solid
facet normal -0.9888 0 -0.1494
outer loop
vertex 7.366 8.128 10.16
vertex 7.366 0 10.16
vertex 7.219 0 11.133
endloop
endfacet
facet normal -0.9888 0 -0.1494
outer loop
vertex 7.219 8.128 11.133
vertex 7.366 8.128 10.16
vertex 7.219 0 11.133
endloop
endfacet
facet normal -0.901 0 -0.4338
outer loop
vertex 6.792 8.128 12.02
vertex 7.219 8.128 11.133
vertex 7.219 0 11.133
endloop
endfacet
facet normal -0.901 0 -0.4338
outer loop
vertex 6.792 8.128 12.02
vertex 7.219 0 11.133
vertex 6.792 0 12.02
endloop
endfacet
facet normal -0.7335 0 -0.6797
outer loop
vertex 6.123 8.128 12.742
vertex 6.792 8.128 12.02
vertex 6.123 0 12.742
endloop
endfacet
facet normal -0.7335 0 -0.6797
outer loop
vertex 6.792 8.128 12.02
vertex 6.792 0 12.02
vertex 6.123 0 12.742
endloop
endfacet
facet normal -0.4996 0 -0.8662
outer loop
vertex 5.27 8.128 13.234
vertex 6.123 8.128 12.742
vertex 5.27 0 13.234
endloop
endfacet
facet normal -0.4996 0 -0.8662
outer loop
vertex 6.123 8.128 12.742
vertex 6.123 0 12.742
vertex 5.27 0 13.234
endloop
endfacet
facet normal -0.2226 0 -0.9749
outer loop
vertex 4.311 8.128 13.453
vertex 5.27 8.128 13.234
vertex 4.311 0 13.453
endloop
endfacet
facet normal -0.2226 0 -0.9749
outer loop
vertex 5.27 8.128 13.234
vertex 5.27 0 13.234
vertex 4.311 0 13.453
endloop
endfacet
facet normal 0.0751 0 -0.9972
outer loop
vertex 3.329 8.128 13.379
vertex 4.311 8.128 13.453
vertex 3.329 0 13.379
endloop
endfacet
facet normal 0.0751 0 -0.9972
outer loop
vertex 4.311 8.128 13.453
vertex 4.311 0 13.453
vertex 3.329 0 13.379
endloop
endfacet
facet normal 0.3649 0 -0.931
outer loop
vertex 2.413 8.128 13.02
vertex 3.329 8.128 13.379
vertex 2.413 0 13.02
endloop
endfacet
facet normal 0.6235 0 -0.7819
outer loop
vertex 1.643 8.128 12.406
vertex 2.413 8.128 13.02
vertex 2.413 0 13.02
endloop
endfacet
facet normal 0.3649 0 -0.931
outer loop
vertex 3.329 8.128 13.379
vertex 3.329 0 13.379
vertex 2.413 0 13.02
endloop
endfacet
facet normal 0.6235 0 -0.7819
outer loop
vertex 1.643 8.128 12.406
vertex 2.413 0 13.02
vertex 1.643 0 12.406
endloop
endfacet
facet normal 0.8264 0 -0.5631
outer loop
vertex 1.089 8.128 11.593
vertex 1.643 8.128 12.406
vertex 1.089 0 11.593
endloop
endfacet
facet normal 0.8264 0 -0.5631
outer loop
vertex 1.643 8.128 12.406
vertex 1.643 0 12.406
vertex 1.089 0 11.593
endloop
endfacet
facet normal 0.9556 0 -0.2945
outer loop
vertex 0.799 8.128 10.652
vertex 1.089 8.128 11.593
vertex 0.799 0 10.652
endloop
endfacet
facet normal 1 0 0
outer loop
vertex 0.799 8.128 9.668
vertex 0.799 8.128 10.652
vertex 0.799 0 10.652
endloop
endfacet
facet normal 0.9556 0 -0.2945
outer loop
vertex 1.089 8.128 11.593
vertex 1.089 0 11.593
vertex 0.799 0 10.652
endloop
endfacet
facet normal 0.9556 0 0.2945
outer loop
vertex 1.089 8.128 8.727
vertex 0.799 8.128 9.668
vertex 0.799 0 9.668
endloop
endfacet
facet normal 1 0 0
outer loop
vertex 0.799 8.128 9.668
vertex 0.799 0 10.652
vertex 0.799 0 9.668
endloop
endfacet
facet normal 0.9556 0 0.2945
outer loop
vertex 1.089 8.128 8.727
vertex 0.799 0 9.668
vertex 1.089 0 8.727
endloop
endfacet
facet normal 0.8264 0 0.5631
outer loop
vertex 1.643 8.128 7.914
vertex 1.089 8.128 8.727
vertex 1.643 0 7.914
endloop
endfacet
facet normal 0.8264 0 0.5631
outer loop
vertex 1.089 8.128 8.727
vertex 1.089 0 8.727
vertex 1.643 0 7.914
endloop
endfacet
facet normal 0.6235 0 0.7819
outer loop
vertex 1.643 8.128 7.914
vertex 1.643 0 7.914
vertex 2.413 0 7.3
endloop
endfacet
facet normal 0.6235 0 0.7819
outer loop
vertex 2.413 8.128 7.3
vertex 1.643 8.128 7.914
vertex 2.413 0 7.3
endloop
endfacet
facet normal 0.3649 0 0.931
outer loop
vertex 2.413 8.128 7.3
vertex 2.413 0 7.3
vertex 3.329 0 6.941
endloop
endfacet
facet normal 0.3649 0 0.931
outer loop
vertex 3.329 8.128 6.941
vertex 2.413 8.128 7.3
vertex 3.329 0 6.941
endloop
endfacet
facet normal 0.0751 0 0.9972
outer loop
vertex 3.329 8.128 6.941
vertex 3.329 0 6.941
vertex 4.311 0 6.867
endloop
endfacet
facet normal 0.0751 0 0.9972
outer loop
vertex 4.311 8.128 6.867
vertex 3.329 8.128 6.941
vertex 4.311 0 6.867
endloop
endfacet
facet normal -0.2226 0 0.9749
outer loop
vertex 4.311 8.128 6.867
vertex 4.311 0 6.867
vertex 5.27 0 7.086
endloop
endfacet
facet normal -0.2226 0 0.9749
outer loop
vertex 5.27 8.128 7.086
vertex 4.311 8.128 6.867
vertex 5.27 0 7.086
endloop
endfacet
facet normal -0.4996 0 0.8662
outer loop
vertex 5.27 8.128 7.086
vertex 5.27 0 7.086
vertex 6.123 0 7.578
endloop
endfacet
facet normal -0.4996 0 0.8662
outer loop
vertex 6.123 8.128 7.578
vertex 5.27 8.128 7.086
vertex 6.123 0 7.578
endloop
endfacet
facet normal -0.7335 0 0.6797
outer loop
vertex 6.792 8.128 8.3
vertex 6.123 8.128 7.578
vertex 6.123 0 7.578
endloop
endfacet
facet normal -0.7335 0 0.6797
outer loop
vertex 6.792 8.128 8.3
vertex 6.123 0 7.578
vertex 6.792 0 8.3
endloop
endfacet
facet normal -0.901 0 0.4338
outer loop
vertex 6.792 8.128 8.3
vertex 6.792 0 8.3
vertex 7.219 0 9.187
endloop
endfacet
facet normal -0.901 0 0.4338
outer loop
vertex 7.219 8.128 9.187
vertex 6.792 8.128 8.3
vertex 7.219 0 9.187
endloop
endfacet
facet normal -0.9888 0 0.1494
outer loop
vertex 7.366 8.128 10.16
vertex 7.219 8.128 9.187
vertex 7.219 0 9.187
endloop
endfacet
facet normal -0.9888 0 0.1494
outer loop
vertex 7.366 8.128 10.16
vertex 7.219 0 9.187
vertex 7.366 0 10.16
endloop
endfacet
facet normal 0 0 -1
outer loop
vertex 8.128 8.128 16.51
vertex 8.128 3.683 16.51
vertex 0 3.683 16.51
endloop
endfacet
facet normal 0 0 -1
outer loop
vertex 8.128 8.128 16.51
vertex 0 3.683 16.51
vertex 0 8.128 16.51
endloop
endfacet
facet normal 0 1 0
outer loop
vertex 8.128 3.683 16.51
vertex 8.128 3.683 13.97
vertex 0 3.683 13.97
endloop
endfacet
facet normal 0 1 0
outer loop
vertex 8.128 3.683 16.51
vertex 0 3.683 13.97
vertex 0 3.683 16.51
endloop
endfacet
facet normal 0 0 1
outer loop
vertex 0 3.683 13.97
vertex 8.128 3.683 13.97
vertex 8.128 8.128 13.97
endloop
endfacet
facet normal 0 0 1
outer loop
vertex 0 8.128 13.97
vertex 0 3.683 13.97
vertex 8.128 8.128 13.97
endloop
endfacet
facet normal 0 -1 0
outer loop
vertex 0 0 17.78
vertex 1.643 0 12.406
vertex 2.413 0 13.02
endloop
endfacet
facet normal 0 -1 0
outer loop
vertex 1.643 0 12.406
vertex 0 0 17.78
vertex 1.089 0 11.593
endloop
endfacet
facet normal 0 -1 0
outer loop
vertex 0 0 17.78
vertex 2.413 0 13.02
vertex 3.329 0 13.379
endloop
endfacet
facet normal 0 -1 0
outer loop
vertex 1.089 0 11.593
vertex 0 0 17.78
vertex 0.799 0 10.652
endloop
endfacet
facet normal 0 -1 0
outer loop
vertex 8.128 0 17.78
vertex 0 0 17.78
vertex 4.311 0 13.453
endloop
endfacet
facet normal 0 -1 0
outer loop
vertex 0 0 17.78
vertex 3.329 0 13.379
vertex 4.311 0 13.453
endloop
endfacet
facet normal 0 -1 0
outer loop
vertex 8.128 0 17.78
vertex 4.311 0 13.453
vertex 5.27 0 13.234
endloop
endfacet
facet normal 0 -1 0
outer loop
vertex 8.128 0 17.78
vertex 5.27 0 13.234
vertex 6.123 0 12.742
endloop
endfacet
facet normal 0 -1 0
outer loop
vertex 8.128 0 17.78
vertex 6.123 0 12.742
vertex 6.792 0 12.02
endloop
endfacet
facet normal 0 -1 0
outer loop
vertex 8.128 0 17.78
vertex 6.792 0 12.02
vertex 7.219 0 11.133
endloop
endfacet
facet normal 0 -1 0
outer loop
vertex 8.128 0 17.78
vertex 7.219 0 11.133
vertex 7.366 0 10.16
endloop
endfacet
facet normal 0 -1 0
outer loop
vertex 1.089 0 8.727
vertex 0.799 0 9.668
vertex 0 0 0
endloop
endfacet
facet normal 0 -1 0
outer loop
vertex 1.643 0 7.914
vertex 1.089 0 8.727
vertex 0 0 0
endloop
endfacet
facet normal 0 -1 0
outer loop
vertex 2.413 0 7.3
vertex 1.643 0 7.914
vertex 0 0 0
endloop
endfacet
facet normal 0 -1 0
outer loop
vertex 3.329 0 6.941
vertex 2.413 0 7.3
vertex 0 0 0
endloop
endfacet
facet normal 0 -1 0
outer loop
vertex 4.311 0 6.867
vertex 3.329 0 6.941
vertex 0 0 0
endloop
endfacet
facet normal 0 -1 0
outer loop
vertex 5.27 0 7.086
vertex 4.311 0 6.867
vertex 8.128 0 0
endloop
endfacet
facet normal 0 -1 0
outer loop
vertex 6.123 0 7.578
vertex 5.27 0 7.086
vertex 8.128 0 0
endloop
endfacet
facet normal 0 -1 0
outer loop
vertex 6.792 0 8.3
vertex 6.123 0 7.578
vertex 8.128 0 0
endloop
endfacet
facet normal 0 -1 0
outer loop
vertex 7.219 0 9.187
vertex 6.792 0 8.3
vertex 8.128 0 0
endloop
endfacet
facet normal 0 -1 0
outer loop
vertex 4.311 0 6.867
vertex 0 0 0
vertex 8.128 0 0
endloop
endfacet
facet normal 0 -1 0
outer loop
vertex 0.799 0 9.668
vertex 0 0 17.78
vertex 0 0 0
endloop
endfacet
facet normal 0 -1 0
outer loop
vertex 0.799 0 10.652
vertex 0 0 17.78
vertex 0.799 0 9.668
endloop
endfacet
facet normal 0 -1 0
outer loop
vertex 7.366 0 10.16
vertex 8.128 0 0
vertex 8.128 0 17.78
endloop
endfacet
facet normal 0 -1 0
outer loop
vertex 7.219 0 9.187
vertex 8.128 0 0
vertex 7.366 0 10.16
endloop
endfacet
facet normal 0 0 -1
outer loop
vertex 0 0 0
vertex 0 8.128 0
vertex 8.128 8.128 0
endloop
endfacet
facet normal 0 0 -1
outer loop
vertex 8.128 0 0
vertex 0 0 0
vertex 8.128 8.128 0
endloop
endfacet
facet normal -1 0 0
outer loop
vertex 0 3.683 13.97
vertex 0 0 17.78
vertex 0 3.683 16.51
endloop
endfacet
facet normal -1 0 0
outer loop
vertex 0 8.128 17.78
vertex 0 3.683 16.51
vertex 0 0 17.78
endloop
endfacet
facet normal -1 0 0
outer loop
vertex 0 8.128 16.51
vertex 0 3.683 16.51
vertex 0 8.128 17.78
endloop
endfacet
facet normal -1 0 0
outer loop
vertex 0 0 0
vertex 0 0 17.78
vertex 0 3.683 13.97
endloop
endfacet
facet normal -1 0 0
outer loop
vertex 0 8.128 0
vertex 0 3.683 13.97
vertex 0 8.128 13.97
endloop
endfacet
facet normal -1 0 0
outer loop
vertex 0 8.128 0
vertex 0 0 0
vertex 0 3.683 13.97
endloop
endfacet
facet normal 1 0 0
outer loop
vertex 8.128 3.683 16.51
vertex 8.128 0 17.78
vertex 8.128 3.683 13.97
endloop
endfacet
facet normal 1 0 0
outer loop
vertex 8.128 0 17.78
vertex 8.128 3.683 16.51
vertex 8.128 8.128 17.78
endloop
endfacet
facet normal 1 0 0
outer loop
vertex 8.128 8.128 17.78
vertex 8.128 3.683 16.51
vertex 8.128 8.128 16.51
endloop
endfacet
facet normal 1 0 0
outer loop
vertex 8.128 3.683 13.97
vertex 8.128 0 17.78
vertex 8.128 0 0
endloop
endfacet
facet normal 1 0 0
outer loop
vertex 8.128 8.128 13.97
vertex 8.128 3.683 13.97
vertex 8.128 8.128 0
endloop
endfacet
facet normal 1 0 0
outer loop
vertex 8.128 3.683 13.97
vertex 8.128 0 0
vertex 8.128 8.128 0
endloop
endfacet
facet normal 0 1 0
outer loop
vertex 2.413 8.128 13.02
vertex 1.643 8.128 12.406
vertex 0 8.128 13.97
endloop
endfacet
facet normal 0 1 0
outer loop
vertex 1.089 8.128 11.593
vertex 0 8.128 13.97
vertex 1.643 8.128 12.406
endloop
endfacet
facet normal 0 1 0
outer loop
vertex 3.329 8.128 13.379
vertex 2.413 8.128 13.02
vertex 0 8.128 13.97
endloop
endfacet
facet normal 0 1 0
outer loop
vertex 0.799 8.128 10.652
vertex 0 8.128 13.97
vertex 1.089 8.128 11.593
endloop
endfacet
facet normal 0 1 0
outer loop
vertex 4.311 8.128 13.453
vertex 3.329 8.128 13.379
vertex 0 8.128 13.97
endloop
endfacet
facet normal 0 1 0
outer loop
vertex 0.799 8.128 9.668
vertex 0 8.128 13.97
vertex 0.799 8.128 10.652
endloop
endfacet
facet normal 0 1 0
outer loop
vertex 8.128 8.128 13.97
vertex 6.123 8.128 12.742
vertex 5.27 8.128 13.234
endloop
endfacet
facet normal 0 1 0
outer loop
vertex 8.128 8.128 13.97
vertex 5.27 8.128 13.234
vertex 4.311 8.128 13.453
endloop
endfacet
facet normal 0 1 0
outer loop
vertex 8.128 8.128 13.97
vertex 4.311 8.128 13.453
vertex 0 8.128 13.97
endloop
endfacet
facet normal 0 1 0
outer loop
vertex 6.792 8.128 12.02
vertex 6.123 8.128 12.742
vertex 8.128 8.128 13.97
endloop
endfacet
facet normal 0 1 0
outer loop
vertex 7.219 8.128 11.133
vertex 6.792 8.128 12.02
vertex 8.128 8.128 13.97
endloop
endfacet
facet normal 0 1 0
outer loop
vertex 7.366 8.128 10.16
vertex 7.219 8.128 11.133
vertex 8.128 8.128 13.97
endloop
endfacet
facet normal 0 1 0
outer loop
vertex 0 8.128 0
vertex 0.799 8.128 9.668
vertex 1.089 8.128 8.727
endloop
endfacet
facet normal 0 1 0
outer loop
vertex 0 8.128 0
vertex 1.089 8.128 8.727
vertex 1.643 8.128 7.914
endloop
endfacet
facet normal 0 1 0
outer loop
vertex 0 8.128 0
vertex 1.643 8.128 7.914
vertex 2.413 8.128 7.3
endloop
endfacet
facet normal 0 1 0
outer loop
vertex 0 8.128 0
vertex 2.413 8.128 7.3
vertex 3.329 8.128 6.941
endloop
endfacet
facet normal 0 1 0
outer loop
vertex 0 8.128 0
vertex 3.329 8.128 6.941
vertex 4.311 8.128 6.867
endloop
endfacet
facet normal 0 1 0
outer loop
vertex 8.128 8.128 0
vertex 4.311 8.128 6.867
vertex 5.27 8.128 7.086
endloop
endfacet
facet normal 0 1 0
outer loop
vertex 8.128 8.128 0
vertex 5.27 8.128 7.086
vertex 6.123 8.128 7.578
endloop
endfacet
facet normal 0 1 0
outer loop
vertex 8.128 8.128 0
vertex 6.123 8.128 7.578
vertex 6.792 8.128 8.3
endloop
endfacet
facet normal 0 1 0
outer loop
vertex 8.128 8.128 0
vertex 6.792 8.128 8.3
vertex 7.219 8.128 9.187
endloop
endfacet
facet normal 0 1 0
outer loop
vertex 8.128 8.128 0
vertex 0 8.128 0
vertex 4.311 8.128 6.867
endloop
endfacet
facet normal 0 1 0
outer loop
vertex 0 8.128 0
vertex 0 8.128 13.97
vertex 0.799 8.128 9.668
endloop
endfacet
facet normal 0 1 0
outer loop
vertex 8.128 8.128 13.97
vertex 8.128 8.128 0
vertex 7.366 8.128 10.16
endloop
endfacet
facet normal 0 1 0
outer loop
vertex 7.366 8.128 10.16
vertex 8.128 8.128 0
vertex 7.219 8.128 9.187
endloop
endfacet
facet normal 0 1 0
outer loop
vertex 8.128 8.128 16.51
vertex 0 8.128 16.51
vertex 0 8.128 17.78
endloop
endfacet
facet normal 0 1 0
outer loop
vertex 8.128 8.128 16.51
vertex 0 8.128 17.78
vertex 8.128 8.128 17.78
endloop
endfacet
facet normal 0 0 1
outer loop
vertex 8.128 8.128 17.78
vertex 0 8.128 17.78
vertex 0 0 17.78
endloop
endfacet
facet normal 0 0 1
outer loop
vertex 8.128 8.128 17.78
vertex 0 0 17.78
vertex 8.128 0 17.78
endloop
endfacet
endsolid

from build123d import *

# Parameters (mm, degrees)
F0_W     = 8.128
F0_H     = 8.128
F1_DEPTH = 17.78
F2_W     = 4.445
F2_H     = 2.54
F3_DEPTH = 25.4
F4_R     = 3.302
F5_DEPTH = 25.4


with BuildPart() as f1:
    # F0 (on Top) → F1 (new body)
    with BuildSketch(Plane.XY):
        with Locations((4.064, 4.064)):
            Rectangle(F0_W, F0_H)
    extrude(amount=F1_DEPTH)

    # F2 (on face) → F3 (cut)
    with BuildSketch(Plane.YZ.offset(8.128)):
        with Locations((5.9055, 15.24)):
            Rectangle(F2_W, F2_H)
    extrude(amount=-F3_DEPTH, mode=Mode.SUBTRACT)

    # F4 (on face) → F5 (cut)
    with BuildSketch(Plane.XZ):
        with Locations((4.064, 10.16)):
            Circle(F4_R)
    extrude(amount=-F5_DEPTH, mode=Mode.SUBTRACT)


solid = f1.part
